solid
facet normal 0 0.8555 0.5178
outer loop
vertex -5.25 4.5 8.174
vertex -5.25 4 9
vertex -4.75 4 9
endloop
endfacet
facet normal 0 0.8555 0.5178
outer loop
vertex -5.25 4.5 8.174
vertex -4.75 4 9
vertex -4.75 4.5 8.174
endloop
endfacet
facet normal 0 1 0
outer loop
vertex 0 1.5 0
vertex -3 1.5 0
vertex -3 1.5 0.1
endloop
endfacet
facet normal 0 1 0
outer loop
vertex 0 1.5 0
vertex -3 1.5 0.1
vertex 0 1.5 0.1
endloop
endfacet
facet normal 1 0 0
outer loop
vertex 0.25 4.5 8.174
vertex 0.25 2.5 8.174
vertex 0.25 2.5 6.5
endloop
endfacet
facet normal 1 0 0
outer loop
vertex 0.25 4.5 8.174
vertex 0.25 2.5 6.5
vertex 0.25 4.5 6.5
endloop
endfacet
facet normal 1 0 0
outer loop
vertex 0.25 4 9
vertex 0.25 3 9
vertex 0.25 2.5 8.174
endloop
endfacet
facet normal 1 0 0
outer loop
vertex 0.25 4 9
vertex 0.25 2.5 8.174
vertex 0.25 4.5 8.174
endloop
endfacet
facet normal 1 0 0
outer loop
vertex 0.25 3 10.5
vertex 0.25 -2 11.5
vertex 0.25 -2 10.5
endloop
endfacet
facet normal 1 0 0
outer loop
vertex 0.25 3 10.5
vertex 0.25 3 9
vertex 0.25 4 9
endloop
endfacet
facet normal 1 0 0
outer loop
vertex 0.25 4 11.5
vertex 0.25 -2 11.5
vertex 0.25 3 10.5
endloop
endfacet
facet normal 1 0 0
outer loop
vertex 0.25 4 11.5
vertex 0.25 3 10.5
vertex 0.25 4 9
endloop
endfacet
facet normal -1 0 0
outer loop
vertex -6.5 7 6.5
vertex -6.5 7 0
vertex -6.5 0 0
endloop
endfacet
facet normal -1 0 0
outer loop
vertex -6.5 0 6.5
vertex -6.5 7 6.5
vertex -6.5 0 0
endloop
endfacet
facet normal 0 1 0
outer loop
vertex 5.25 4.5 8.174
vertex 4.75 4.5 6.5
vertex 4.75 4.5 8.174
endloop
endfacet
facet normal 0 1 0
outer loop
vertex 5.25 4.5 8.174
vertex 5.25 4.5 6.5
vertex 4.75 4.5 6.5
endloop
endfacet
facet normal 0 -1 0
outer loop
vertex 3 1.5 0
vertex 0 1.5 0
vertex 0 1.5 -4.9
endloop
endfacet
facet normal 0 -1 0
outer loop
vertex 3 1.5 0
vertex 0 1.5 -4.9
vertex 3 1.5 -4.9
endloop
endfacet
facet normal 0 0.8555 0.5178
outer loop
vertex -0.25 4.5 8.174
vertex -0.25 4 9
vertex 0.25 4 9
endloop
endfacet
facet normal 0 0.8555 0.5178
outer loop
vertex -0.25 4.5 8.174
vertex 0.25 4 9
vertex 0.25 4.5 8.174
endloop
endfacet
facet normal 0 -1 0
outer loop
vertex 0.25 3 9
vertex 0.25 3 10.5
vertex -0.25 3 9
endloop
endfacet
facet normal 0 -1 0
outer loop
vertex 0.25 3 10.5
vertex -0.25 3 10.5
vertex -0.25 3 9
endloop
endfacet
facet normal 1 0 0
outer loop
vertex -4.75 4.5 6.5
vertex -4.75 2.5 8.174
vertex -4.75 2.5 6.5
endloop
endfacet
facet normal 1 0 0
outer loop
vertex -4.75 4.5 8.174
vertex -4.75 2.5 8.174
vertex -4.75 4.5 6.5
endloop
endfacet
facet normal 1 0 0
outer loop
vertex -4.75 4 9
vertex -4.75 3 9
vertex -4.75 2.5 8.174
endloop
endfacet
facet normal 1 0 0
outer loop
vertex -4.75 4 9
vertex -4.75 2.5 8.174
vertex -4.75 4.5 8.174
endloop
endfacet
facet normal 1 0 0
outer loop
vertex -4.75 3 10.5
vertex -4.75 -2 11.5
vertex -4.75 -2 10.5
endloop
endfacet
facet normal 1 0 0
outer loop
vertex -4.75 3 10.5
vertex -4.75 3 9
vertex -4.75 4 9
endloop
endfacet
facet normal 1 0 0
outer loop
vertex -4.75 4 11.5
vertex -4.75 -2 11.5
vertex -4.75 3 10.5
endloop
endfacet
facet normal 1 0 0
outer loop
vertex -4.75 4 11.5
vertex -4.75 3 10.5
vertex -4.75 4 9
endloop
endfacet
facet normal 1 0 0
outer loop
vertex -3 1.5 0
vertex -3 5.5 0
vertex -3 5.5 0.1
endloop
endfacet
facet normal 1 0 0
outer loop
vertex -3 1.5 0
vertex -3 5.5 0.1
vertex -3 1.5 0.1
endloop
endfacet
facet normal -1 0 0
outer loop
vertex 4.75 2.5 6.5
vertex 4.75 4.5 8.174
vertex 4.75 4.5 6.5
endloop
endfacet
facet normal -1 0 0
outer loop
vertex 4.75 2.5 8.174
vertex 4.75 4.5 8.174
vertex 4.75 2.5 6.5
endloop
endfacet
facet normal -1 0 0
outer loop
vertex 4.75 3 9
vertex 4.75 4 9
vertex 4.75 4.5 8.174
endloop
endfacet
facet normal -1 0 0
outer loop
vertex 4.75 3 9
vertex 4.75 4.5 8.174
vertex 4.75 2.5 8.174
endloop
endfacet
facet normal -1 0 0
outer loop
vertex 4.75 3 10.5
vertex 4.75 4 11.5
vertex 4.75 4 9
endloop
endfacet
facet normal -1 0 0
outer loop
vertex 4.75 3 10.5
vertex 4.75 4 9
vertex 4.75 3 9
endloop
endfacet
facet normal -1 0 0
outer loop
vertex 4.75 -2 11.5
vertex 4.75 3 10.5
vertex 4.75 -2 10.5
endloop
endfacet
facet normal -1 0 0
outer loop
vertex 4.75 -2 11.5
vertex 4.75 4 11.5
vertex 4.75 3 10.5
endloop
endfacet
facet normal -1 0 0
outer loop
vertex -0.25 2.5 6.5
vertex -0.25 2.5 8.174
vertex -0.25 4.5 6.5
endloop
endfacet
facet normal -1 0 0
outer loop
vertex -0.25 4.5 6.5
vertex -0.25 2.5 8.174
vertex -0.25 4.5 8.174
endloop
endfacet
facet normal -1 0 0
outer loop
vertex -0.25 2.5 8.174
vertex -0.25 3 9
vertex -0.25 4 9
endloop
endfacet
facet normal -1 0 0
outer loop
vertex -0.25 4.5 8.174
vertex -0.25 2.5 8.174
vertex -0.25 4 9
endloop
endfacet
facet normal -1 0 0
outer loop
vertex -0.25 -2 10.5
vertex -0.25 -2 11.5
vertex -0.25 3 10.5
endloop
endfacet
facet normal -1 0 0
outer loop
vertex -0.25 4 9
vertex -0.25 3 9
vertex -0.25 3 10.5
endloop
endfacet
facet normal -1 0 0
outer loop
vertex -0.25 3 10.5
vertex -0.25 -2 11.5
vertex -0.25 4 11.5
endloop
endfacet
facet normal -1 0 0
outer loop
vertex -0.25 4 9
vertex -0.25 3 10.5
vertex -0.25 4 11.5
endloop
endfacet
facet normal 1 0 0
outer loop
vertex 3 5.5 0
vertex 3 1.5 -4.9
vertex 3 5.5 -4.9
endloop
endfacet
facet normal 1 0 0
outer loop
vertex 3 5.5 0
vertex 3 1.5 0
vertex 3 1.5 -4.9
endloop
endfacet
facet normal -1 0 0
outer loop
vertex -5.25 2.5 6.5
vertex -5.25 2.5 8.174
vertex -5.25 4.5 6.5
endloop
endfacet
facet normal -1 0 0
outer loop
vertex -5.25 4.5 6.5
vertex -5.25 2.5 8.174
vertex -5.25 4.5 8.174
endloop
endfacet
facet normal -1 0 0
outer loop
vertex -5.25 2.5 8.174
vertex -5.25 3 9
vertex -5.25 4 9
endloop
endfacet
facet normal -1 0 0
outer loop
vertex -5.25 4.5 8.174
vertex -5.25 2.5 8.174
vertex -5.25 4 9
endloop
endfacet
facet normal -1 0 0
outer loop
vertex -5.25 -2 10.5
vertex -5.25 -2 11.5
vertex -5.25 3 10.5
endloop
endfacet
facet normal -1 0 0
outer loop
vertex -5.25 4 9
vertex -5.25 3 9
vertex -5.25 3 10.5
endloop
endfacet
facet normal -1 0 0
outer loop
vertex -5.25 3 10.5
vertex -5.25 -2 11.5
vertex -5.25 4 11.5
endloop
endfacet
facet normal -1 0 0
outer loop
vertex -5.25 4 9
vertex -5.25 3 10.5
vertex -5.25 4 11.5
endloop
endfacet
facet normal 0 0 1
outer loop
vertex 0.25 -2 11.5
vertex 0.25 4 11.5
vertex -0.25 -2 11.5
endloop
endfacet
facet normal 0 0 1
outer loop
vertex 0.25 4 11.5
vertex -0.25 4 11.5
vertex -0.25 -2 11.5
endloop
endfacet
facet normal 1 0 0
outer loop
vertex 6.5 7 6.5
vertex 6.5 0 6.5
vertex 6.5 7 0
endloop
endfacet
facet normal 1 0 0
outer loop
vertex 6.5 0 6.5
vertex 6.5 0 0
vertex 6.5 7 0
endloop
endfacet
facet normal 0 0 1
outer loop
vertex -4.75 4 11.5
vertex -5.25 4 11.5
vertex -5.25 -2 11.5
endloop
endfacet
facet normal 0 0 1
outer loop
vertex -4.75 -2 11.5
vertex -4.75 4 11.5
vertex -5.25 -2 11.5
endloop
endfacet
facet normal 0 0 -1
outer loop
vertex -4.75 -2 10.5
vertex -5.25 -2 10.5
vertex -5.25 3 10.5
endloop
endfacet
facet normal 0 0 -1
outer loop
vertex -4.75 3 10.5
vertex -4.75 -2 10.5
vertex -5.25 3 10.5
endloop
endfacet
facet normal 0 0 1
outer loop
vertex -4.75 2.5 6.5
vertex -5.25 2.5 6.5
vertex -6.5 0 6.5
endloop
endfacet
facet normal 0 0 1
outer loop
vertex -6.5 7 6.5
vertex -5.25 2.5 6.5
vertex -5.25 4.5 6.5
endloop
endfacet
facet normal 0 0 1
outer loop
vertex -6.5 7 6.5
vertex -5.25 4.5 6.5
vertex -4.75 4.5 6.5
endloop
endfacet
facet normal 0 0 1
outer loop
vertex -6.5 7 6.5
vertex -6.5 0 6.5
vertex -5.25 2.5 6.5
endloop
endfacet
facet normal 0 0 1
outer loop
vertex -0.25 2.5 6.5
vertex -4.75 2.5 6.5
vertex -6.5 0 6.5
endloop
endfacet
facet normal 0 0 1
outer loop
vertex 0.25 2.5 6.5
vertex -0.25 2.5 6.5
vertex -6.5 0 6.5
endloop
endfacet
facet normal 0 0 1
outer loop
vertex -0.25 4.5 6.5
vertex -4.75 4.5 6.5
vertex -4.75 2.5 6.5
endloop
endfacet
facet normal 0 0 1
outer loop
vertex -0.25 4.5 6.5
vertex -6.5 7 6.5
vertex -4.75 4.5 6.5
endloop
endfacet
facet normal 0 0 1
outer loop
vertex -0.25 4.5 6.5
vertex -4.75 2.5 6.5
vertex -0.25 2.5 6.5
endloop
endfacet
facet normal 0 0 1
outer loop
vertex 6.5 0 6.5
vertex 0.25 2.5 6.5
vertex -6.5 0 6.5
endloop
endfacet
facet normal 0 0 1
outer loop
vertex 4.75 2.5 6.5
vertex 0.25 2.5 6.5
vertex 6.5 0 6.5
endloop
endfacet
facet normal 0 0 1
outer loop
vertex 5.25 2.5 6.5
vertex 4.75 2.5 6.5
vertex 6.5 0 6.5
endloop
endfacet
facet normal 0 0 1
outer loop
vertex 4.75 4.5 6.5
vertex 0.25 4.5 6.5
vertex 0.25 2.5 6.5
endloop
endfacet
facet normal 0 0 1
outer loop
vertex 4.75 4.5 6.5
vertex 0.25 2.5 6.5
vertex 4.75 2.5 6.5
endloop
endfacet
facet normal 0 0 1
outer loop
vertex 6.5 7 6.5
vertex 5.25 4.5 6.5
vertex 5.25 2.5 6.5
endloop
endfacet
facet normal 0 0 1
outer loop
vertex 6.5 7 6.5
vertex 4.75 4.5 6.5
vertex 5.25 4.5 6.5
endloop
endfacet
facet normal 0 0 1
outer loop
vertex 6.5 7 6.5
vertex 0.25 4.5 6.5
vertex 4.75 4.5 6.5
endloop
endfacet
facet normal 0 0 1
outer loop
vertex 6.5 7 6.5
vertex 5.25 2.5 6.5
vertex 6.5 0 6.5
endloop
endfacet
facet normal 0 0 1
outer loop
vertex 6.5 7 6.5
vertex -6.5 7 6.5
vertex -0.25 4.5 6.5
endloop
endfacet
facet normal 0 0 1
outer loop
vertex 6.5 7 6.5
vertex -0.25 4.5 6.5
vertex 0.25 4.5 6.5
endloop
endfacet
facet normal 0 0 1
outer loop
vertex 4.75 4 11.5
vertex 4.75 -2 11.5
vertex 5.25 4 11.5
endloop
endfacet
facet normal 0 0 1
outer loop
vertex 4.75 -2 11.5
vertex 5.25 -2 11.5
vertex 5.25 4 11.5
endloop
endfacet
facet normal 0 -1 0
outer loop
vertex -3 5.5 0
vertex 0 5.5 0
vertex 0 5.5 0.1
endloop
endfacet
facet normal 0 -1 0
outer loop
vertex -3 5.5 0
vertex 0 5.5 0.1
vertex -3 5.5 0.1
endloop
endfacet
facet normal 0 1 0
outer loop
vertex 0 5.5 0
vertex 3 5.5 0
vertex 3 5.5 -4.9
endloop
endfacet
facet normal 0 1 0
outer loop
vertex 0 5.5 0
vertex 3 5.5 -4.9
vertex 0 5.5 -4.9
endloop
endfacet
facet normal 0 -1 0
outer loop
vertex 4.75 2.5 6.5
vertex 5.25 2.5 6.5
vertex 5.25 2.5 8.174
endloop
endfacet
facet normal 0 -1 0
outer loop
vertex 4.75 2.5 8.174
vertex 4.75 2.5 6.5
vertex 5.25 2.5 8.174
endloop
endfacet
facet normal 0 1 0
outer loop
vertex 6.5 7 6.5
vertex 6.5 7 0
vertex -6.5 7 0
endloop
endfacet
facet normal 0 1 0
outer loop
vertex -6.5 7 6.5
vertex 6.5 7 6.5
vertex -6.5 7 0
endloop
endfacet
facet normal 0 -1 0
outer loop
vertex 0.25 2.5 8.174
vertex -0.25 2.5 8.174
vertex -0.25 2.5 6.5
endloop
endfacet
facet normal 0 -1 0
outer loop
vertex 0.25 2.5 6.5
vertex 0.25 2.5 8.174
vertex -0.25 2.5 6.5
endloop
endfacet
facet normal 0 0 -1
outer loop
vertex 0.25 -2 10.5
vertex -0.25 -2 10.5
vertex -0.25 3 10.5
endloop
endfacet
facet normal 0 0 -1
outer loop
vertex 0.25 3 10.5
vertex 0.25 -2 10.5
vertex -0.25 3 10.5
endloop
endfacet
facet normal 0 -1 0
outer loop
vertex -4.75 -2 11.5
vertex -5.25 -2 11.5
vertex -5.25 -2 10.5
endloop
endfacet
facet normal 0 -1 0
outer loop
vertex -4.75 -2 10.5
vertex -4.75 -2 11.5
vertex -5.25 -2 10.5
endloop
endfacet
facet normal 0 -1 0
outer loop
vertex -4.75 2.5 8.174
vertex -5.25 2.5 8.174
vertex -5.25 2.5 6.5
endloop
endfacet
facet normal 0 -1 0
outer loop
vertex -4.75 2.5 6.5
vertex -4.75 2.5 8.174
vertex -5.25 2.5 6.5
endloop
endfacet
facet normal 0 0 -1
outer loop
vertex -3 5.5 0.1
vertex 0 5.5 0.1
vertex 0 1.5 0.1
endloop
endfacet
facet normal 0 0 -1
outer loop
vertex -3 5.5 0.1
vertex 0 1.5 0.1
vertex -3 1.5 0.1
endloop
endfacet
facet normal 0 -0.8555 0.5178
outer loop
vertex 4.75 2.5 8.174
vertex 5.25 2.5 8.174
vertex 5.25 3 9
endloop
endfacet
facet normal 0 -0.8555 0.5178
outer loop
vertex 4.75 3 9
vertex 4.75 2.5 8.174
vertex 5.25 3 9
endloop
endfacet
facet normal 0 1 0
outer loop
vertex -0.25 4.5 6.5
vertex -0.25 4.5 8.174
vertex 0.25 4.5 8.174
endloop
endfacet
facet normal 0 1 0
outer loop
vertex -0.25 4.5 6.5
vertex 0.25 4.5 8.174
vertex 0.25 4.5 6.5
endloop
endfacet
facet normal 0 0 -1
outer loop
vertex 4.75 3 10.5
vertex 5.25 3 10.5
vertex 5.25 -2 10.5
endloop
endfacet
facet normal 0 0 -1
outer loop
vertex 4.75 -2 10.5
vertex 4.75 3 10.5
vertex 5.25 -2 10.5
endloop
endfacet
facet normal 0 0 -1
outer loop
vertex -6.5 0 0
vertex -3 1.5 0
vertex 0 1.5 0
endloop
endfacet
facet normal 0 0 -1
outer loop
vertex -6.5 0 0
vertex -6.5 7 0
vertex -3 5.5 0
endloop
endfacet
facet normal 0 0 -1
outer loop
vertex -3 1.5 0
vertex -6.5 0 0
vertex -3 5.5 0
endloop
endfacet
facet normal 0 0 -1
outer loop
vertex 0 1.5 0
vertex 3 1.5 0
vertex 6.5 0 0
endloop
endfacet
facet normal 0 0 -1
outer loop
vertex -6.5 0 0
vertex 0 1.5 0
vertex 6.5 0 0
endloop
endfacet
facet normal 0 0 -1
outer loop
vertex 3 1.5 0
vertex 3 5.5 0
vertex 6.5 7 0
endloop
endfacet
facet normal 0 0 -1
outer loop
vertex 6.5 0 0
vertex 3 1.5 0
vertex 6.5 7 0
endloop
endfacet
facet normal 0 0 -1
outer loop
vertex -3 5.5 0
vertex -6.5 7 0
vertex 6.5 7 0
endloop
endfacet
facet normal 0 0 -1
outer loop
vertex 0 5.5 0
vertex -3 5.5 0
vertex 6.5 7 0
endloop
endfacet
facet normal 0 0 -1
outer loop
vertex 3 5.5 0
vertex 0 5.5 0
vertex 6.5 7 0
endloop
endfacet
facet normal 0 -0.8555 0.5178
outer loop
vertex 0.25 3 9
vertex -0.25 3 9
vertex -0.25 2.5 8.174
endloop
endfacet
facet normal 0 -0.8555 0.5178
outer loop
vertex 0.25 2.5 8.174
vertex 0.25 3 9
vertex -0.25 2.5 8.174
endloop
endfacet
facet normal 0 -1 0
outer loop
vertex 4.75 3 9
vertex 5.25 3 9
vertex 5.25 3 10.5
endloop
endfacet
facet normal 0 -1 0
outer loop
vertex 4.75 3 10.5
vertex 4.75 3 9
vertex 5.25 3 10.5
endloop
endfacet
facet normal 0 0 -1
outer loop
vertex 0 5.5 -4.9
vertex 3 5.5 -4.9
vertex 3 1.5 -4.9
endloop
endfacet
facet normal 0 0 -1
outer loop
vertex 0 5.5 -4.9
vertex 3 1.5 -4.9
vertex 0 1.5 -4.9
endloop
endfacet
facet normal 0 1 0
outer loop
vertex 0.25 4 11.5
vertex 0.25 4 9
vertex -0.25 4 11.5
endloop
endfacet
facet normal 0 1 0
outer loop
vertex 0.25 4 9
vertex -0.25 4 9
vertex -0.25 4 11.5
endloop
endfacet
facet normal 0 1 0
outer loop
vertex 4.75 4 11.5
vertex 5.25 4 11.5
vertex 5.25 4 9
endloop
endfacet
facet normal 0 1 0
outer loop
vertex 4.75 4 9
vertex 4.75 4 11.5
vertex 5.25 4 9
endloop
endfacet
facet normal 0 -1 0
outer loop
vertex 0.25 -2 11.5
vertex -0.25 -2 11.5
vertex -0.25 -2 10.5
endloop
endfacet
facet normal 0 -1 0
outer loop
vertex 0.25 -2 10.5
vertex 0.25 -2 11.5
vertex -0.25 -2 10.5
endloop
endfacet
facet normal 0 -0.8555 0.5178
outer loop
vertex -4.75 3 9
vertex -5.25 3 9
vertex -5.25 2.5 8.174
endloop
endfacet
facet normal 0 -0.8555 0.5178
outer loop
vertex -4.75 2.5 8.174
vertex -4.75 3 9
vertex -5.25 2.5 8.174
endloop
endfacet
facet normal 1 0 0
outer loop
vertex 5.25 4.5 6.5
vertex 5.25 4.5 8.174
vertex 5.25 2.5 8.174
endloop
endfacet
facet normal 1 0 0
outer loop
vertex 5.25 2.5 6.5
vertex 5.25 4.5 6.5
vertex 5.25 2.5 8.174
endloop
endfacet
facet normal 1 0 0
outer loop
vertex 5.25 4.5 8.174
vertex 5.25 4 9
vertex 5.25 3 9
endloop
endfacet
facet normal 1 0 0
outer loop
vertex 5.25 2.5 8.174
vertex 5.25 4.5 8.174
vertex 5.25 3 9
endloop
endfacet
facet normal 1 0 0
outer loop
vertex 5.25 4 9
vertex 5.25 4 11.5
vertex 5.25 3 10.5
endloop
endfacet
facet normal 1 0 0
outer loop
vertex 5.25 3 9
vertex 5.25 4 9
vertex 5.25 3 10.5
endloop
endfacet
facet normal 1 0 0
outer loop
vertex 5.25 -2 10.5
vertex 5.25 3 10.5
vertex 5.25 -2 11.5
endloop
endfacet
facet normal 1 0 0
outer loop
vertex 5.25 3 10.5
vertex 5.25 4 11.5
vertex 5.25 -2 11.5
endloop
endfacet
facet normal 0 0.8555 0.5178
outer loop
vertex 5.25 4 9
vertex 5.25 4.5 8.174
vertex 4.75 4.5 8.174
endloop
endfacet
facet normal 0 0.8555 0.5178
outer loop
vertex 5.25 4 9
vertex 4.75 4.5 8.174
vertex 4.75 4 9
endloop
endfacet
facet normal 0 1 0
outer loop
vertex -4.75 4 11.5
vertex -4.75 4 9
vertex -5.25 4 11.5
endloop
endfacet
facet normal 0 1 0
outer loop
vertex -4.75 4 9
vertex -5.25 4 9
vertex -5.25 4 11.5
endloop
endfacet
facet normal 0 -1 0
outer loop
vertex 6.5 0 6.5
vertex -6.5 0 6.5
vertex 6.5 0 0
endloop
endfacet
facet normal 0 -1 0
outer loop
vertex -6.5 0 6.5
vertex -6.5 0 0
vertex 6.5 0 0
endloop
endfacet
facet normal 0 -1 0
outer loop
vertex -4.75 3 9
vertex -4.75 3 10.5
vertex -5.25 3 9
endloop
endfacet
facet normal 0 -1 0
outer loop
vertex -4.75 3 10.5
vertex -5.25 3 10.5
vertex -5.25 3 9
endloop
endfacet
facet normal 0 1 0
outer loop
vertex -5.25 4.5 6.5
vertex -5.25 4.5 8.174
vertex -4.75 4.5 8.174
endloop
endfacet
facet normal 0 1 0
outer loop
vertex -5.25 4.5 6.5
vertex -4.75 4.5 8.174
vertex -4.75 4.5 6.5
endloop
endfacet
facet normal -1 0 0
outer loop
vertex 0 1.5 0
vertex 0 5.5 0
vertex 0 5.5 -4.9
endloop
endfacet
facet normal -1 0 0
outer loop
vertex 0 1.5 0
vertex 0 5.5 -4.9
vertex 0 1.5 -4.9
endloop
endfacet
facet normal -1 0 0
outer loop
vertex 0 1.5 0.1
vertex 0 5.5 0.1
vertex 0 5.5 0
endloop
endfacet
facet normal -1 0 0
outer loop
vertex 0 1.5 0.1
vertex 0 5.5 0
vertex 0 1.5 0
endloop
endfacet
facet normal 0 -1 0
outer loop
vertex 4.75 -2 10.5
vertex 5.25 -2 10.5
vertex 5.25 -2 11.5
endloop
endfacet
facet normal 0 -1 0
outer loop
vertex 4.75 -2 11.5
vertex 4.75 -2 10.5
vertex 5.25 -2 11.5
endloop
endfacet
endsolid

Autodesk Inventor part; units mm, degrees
ref_plane "YZ Plane" through (0, 0, 0) normal (1, 0, 0) x (0, 1, 0)
ref_plane "XZ Plane" through (0, 0, 0) normal (0, 1, 0) x (-1, 0, 0)
ref_plane "XY Plane" through (0, 0, 0) normal (0, 0, 1) x (1, 0, 0)
sketch "Sketch1" plane through (0, 0, 0) normal (0, 0, 1) x (1, 0, 0)
  line L0 (-6.5, 0) -> (6.5, 0)
  line L1 (6.5, 0) -> (6.5, 7)
  line L2 (6.5, 7) -> (-6.5, 7)
  line L3 (-6.5, 7) -> (-6.5, 0)
  point P0 (0, 0)
  point P1 (0, 0)
  dimension "d0" = 13
  dimension "d1" = 7
extrude "Extrusion1" add sketch "Sketch1" along normal blind 6.5
sketch "Sketch2" plane through (0, 0, 0) normal (0, 0, -1) x (-1, 0, 0)
  line L0 (-3, 5.5) -> (3, 5.5)
  line L1 (3, 5.5) -> (3, 1.5)
  line L2 (3, 1.5) -> (-3, 1.5)
  line L3 (-3, 1.5) -> (-3, 5.5)
  line L4 (6.5, 0) -> (-6.5, 0) projected
  line L5 (-6.5, 0) -> (-6.5, 7) projected
  point P0 (0, 0)
  point P1 (0, 1.5)
  point P2 (0, 0)
  point P3 (-3, 3.5)
  point P4 (-6.5, 3.5)
  dimension "d4" = 4
  dimension "d5" = 6
extrude "Extrusion2" cut sketch "Sketch2" against normal blind 0.1
sketch "Sketch3" plane through (0, 0, 0.1) normal (0, 0, -1) x (-1, 0, 0)
  line L0 (-3, 1.5) -> (-3, 5.5) projected
  line L1 (3, 1.5) -> (-3, 1.5) projected
  line L2 (-3, 5.5) -> (0, 5.5)
  line L3 (0, 5.5) -> (0, 1.5)
  line L4 (0, 1.5) -> (-3, 1.5)
  line L5 (-3, 1.5) -> (-3, 5.5)
  point P0 (0, 0)
extrude "Extrusion3" add sketch "Sketch3" along normal blind 5
sketch "Sketch4" plane through (0, 0, 0) normal (1, 0, 0) x (0, 1, 0)
  line L0 (0, 6.5) -> (7, 6.5) projected
  line L1 (4, 6.5) -> (4, 11.5)
  line L2 (4, 11.5) -> (-2, 11.5)
  line L3 (-2, 11.5) -> (-2, 10.5)
  line L4 (-2, 10.5) -> (3, 10.5)
  line L5 (3, 10.5) -> (3, 6.5)
  line L6 (3, 9) -> (2.5, 8.1738)
  line L7 (2.5, 8.1738) -> (2.5, 6.5)
  line L8 (4, 9) -> (4.5, 8.1738)
  line L9 (4.5, 8.1738) -> (4.5, 6.5)
  line L10 (0, 0) -> (0, 6.5) projected
  line L11 (4, 9) -> (3, 9) construction
  point P0 (-2, 11)
  point P1 (3.5, 9)
  point P2 (3.5, 6.5)
  dimension "d10" = 1
  dimension "d11" = 1
  dimension "d12" = 2
  dimension "d13" = 2
  dimension "d14" = 5
extrude "Extrusion4" add sketch "Sketch4" along normal mid plane 0.5
pattern_linear "Rectangular Pattern1" count 2 spacing 5 along (-1, 0, 0) of "Extrusion4"
mirror "Mirror1" about plane through (0, 0, 0) normal (1, 0, 0) of "Extrusion4", "Rectangular Pattern1"
properties part number "Switch"
